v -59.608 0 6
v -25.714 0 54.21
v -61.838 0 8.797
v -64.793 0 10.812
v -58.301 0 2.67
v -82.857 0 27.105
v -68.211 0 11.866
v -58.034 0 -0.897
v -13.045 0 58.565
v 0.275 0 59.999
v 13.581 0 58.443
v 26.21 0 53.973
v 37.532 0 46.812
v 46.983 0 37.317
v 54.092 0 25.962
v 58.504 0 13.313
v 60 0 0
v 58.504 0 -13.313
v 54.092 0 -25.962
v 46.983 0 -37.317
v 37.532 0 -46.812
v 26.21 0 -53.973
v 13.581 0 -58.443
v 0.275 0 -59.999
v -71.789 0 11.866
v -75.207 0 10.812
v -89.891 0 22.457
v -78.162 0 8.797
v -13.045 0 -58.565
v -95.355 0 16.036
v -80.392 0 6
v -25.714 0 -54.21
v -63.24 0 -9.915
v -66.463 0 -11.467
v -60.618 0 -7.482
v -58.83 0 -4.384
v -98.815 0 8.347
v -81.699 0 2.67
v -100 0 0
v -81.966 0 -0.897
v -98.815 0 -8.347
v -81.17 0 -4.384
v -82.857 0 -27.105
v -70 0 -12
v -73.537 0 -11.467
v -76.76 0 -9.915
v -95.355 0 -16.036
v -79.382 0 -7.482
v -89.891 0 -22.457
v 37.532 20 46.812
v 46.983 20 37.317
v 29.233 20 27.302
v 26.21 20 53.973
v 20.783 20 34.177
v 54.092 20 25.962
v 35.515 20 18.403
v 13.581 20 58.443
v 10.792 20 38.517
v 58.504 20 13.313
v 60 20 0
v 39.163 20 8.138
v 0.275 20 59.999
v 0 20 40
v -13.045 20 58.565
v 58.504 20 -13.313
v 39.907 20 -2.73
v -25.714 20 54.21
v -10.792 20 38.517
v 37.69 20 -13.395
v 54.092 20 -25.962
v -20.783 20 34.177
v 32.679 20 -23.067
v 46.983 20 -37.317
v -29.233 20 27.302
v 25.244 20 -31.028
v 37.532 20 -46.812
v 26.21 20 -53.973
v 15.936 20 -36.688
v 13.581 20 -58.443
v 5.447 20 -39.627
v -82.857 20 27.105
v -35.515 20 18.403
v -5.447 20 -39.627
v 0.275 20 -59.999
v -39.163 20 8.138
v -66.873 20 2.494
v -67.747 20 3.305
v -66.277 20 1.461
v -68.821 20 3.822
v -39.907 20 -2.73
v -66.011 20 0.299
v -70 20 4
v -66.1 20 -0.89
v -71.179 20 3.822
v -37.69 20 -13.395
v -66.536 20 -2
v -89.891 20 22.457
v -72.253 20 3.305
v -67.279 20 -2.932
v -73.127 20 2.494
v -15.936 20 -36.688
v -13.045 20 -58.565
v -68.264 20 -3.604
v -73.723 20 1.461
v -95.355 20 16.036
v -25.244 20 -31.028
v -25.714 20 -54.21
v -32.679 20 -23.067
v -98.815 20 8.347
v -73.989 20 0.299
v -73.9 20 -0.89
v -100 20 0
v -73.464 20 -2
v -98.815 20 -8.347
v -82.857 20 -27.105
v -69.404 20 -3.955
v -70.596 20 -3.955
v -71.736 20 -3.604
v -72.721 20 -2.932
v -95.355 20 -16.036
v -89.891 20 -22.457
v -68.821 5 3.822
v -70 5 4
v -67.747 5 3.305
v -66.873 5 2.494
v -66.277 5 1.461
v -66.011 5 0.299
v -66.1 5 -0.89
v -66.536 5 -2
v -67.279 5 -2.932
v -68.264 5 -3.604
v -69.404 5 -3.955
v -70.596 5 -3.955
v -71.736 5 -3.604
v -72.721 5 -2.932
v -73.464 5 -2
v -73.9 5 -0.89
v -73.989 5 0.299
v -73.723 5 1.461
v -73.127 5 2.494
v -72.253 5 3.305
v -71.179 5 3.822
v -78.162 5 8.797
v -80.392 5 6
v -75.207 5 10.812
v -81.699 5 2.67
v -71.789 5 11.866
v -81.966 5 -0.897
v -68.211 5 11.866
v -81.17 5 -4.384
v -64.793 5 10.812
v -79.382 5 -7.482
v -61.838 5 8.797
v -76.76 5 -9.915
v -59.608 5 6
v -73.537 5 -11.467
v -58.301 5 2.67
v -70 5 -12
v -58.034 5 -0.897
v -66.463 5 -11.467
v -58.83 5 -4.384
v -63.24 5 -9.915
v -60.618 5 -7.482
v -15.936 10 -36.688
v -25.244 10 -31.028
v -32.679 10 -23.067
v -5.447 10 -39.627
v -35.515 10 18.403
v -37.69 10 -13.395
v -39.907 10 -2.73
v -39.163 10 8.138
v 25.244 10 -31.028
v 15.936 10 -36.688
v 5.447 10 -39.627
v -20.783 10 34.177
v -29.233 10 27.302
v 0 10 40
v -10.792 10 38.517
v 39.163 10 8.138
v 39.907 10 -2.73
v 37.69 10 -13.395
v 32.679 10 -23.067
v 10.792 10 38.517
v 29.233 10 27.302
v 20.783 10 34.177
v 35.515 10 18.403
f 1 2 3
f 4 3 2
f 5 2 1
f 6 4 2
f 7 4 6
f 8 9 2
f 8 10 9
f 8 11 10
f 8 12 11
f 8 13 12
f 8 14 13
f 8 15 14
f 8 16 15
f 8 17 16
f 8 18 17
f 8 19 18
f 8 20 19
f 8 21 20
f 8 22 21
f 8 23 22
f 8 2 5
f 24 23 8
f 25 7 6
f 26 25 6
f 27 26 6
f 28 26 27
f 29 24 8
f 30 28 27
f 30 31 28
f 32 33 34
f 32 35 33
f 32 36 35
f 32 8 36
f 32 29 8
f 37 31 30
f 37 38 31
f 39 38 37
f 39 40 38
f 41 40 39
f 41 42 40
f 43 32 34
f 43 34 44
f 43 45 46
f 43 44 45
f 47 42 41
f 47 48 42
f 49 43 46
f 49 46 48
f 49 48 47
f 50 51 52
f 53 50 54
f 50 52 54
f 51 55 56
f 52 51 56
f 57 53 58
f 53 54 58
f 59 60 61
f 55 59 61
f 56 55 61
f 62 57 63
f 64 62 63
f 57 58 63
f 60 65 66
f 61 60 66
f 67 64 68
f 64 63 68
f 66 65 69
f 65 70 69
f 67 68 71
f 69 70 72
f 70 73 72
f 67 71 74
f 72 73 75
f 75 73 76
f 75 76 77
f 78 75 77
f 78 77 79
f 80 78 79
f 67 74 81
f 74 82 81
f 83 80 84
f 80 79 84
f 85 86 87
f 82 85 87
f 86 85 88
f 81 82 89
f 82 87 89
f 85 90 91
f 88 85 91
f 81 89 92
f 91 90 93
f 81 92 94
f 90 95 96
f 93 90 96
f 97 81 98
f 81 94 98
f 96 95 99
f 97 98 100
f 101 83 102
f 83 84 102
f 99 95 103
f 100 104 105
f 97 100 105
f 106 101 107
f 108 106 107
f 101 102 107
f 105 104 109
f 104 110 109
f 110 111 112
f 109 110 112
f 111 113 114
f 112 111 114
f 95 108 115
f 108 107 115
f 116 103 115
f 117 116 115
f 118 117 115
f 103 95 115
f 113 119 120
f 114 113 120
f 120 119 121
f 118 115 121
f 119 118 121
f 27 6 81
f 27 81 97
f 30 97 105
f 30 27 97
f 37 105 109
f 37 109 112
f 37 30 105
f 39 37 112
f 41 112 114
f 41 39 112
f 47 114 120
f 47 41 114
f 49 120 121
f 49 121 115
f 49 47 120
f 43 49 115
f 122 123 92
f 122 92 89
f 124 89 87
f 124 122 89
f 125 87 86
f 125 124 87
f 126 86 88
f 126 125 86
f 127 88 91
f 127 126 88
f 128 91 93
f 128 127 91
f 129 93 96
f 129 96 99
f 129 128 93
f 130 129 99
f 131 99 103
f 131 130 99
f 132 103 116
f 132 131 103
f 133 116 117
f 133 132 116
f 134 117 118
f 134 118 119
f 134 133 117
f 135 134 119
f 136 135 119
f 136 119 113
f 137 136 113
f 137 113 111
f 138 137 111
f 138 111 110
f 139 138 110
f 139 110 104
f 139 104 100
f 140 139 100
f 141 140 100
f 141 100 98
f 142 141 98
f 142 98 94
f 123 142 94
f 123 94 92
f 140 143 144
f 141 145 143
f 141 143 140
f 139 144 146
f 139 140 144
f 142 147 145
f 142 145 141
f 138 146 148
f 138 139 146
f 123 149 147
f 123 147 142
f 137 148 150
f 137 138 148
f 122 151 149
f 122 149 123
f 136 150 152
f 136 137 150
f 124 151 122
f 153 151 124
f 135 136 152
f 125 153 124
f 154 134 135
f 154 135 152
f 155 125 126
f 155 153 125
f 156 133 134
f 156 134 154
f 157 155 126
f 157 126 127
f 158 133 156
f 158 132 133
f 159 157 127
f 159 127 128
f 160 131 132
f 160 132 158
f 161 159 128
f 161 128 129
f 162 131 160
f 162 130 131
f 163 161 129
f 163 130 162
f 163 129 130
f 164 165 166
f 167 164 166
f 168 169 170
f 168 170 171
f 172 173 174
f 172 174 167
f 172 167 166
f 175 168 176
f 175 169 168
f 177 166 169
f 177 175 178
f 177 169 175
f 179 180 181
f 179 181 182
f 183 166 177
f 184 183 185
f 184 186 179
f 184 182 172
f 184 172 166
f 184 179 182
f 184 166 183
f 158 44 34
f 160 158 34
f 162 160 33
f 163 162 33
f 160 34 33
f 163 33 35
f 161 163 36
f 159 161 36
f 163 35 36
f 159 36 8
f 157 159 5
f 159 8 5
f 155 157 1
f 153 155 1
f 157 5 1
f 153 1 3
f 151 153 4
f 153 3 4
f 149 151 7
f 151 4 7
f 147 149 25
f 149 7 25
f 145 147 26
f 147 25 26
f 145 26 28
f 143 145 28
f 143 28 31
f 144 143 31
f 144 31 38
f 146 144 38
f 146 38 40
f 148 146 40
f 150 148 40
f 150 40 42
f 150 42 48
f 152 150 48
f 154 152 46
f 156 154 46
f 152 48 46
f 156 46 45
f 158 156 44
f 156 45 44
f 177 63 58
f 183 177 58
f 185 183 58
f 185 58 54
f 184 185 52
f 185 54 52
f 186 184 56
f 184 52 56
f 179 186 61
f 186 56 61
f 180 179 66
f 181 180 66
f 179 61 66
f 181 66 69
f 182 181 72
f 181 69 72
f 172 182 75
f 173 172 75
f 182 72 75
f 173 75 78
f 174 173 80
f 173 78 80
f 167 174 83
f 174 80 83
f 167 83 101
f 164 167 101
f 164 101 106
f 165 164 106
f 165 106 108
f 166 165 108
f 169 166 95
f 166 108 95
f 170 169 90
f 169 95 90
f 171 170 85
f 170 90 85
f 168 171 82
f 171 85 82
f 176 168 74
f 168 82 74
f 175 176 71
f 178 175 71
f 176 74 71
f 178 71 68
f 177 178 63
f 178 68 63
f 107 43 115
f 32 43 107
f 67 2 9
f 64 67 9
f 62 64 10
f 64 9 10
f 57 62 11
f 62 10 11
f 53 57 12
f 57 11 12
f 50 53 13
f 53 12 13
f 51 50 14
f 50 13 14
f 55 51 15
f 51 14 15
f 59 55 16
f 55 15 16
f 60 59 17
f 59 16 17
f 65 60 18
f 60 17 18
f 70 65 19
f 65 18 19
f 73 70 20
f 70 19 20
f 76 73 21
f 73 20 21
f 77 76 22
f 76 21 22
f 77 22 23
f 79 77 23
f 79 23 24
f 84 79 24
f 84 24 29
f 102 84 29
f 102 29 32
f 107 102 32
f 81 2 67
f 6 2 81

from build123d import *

# Parameters (mm, degrees)
SKETCH1_R           = 60
BOSS_EXTRUDE1_DEPTH = 20
SKETCH3_R           = 4
BOSS_EXTRUDE2_DEPTH = 20
SKETCH2_R           = 40
CUT_EXTRUDE1_DEPTH  = 10
SKETCH5_R           = 12
CUT_EXTRUDE2_DEPTH  = 5


with BuildPart() as part:
    # Sketch1 → Boss-Extrude1 (new body)
    with BuildSketch(Plane(origin=(0, 0, 0), x_dir=(1, 0, 0), z_dir=(0, 1, 0))):
        with Locations(Location((0, 0, 0), (0, 0, 270))):
            Circle(SKETCH1_R)
    extrude(amount=BOSS_EXTRUDE1_DEPTH)

    # Sketch3 → Boss-Extrude2 (add)
    with BuildSketch(Plane(origin=(0, 0, 0), x_dir=(1, 0, 0), z_dir=(0, 1, 0))):
        with BuildLine():
            Line((-82.857142857, 27.105237087), (-25.714285714, 54.210474174))
            ThreePointArc((-25.714285714, 54.210474174), (60, 0), (-25.714285714, -54.210474174))
            Line((-25.714285714, -54.210474174), (-82.857142857, -27.105237087))
            ThreePointArc((-82.857142857, -27.105237087), (-100, 0), (-82.857142857, 27.105237087))
        make_face()
        with Locations(Location((-70, 0, 0), (0, 0, 270))):
            Circle(SKETCH3_R, mode=Mode.SUBTRACT)
    extrude(amount=BOSS_EXTRUDE2_DEPTH)

    # Sketch2 → Cut-Extrude1 (cut)
    with BuildSketch(Plane(origin=(0, 20, 0), x_dir=(1, 0, 0), z_dir=(0, 1, 0))):
        with Locations(Location((0, 0, 0), (0, 0, 270))):
            Circle(SKETCH2_R)
    extrude(amount=-CUT_EXTRUDE1_DEPTH, mode=Mode.SUBTRACT)

    # Sketch5 → Cut-Extrude2 (cut)
    with BuildSketch(Plane.XZ):
        with Locations(Location((-70, 0, 0), (0, 0, 270))):
            Circle(SKETCH5_R)
    extrude(amount=-CUT_EXTRUDE2_DEPTH, mode=Mode.SUBTRACT)


solid = part.part
